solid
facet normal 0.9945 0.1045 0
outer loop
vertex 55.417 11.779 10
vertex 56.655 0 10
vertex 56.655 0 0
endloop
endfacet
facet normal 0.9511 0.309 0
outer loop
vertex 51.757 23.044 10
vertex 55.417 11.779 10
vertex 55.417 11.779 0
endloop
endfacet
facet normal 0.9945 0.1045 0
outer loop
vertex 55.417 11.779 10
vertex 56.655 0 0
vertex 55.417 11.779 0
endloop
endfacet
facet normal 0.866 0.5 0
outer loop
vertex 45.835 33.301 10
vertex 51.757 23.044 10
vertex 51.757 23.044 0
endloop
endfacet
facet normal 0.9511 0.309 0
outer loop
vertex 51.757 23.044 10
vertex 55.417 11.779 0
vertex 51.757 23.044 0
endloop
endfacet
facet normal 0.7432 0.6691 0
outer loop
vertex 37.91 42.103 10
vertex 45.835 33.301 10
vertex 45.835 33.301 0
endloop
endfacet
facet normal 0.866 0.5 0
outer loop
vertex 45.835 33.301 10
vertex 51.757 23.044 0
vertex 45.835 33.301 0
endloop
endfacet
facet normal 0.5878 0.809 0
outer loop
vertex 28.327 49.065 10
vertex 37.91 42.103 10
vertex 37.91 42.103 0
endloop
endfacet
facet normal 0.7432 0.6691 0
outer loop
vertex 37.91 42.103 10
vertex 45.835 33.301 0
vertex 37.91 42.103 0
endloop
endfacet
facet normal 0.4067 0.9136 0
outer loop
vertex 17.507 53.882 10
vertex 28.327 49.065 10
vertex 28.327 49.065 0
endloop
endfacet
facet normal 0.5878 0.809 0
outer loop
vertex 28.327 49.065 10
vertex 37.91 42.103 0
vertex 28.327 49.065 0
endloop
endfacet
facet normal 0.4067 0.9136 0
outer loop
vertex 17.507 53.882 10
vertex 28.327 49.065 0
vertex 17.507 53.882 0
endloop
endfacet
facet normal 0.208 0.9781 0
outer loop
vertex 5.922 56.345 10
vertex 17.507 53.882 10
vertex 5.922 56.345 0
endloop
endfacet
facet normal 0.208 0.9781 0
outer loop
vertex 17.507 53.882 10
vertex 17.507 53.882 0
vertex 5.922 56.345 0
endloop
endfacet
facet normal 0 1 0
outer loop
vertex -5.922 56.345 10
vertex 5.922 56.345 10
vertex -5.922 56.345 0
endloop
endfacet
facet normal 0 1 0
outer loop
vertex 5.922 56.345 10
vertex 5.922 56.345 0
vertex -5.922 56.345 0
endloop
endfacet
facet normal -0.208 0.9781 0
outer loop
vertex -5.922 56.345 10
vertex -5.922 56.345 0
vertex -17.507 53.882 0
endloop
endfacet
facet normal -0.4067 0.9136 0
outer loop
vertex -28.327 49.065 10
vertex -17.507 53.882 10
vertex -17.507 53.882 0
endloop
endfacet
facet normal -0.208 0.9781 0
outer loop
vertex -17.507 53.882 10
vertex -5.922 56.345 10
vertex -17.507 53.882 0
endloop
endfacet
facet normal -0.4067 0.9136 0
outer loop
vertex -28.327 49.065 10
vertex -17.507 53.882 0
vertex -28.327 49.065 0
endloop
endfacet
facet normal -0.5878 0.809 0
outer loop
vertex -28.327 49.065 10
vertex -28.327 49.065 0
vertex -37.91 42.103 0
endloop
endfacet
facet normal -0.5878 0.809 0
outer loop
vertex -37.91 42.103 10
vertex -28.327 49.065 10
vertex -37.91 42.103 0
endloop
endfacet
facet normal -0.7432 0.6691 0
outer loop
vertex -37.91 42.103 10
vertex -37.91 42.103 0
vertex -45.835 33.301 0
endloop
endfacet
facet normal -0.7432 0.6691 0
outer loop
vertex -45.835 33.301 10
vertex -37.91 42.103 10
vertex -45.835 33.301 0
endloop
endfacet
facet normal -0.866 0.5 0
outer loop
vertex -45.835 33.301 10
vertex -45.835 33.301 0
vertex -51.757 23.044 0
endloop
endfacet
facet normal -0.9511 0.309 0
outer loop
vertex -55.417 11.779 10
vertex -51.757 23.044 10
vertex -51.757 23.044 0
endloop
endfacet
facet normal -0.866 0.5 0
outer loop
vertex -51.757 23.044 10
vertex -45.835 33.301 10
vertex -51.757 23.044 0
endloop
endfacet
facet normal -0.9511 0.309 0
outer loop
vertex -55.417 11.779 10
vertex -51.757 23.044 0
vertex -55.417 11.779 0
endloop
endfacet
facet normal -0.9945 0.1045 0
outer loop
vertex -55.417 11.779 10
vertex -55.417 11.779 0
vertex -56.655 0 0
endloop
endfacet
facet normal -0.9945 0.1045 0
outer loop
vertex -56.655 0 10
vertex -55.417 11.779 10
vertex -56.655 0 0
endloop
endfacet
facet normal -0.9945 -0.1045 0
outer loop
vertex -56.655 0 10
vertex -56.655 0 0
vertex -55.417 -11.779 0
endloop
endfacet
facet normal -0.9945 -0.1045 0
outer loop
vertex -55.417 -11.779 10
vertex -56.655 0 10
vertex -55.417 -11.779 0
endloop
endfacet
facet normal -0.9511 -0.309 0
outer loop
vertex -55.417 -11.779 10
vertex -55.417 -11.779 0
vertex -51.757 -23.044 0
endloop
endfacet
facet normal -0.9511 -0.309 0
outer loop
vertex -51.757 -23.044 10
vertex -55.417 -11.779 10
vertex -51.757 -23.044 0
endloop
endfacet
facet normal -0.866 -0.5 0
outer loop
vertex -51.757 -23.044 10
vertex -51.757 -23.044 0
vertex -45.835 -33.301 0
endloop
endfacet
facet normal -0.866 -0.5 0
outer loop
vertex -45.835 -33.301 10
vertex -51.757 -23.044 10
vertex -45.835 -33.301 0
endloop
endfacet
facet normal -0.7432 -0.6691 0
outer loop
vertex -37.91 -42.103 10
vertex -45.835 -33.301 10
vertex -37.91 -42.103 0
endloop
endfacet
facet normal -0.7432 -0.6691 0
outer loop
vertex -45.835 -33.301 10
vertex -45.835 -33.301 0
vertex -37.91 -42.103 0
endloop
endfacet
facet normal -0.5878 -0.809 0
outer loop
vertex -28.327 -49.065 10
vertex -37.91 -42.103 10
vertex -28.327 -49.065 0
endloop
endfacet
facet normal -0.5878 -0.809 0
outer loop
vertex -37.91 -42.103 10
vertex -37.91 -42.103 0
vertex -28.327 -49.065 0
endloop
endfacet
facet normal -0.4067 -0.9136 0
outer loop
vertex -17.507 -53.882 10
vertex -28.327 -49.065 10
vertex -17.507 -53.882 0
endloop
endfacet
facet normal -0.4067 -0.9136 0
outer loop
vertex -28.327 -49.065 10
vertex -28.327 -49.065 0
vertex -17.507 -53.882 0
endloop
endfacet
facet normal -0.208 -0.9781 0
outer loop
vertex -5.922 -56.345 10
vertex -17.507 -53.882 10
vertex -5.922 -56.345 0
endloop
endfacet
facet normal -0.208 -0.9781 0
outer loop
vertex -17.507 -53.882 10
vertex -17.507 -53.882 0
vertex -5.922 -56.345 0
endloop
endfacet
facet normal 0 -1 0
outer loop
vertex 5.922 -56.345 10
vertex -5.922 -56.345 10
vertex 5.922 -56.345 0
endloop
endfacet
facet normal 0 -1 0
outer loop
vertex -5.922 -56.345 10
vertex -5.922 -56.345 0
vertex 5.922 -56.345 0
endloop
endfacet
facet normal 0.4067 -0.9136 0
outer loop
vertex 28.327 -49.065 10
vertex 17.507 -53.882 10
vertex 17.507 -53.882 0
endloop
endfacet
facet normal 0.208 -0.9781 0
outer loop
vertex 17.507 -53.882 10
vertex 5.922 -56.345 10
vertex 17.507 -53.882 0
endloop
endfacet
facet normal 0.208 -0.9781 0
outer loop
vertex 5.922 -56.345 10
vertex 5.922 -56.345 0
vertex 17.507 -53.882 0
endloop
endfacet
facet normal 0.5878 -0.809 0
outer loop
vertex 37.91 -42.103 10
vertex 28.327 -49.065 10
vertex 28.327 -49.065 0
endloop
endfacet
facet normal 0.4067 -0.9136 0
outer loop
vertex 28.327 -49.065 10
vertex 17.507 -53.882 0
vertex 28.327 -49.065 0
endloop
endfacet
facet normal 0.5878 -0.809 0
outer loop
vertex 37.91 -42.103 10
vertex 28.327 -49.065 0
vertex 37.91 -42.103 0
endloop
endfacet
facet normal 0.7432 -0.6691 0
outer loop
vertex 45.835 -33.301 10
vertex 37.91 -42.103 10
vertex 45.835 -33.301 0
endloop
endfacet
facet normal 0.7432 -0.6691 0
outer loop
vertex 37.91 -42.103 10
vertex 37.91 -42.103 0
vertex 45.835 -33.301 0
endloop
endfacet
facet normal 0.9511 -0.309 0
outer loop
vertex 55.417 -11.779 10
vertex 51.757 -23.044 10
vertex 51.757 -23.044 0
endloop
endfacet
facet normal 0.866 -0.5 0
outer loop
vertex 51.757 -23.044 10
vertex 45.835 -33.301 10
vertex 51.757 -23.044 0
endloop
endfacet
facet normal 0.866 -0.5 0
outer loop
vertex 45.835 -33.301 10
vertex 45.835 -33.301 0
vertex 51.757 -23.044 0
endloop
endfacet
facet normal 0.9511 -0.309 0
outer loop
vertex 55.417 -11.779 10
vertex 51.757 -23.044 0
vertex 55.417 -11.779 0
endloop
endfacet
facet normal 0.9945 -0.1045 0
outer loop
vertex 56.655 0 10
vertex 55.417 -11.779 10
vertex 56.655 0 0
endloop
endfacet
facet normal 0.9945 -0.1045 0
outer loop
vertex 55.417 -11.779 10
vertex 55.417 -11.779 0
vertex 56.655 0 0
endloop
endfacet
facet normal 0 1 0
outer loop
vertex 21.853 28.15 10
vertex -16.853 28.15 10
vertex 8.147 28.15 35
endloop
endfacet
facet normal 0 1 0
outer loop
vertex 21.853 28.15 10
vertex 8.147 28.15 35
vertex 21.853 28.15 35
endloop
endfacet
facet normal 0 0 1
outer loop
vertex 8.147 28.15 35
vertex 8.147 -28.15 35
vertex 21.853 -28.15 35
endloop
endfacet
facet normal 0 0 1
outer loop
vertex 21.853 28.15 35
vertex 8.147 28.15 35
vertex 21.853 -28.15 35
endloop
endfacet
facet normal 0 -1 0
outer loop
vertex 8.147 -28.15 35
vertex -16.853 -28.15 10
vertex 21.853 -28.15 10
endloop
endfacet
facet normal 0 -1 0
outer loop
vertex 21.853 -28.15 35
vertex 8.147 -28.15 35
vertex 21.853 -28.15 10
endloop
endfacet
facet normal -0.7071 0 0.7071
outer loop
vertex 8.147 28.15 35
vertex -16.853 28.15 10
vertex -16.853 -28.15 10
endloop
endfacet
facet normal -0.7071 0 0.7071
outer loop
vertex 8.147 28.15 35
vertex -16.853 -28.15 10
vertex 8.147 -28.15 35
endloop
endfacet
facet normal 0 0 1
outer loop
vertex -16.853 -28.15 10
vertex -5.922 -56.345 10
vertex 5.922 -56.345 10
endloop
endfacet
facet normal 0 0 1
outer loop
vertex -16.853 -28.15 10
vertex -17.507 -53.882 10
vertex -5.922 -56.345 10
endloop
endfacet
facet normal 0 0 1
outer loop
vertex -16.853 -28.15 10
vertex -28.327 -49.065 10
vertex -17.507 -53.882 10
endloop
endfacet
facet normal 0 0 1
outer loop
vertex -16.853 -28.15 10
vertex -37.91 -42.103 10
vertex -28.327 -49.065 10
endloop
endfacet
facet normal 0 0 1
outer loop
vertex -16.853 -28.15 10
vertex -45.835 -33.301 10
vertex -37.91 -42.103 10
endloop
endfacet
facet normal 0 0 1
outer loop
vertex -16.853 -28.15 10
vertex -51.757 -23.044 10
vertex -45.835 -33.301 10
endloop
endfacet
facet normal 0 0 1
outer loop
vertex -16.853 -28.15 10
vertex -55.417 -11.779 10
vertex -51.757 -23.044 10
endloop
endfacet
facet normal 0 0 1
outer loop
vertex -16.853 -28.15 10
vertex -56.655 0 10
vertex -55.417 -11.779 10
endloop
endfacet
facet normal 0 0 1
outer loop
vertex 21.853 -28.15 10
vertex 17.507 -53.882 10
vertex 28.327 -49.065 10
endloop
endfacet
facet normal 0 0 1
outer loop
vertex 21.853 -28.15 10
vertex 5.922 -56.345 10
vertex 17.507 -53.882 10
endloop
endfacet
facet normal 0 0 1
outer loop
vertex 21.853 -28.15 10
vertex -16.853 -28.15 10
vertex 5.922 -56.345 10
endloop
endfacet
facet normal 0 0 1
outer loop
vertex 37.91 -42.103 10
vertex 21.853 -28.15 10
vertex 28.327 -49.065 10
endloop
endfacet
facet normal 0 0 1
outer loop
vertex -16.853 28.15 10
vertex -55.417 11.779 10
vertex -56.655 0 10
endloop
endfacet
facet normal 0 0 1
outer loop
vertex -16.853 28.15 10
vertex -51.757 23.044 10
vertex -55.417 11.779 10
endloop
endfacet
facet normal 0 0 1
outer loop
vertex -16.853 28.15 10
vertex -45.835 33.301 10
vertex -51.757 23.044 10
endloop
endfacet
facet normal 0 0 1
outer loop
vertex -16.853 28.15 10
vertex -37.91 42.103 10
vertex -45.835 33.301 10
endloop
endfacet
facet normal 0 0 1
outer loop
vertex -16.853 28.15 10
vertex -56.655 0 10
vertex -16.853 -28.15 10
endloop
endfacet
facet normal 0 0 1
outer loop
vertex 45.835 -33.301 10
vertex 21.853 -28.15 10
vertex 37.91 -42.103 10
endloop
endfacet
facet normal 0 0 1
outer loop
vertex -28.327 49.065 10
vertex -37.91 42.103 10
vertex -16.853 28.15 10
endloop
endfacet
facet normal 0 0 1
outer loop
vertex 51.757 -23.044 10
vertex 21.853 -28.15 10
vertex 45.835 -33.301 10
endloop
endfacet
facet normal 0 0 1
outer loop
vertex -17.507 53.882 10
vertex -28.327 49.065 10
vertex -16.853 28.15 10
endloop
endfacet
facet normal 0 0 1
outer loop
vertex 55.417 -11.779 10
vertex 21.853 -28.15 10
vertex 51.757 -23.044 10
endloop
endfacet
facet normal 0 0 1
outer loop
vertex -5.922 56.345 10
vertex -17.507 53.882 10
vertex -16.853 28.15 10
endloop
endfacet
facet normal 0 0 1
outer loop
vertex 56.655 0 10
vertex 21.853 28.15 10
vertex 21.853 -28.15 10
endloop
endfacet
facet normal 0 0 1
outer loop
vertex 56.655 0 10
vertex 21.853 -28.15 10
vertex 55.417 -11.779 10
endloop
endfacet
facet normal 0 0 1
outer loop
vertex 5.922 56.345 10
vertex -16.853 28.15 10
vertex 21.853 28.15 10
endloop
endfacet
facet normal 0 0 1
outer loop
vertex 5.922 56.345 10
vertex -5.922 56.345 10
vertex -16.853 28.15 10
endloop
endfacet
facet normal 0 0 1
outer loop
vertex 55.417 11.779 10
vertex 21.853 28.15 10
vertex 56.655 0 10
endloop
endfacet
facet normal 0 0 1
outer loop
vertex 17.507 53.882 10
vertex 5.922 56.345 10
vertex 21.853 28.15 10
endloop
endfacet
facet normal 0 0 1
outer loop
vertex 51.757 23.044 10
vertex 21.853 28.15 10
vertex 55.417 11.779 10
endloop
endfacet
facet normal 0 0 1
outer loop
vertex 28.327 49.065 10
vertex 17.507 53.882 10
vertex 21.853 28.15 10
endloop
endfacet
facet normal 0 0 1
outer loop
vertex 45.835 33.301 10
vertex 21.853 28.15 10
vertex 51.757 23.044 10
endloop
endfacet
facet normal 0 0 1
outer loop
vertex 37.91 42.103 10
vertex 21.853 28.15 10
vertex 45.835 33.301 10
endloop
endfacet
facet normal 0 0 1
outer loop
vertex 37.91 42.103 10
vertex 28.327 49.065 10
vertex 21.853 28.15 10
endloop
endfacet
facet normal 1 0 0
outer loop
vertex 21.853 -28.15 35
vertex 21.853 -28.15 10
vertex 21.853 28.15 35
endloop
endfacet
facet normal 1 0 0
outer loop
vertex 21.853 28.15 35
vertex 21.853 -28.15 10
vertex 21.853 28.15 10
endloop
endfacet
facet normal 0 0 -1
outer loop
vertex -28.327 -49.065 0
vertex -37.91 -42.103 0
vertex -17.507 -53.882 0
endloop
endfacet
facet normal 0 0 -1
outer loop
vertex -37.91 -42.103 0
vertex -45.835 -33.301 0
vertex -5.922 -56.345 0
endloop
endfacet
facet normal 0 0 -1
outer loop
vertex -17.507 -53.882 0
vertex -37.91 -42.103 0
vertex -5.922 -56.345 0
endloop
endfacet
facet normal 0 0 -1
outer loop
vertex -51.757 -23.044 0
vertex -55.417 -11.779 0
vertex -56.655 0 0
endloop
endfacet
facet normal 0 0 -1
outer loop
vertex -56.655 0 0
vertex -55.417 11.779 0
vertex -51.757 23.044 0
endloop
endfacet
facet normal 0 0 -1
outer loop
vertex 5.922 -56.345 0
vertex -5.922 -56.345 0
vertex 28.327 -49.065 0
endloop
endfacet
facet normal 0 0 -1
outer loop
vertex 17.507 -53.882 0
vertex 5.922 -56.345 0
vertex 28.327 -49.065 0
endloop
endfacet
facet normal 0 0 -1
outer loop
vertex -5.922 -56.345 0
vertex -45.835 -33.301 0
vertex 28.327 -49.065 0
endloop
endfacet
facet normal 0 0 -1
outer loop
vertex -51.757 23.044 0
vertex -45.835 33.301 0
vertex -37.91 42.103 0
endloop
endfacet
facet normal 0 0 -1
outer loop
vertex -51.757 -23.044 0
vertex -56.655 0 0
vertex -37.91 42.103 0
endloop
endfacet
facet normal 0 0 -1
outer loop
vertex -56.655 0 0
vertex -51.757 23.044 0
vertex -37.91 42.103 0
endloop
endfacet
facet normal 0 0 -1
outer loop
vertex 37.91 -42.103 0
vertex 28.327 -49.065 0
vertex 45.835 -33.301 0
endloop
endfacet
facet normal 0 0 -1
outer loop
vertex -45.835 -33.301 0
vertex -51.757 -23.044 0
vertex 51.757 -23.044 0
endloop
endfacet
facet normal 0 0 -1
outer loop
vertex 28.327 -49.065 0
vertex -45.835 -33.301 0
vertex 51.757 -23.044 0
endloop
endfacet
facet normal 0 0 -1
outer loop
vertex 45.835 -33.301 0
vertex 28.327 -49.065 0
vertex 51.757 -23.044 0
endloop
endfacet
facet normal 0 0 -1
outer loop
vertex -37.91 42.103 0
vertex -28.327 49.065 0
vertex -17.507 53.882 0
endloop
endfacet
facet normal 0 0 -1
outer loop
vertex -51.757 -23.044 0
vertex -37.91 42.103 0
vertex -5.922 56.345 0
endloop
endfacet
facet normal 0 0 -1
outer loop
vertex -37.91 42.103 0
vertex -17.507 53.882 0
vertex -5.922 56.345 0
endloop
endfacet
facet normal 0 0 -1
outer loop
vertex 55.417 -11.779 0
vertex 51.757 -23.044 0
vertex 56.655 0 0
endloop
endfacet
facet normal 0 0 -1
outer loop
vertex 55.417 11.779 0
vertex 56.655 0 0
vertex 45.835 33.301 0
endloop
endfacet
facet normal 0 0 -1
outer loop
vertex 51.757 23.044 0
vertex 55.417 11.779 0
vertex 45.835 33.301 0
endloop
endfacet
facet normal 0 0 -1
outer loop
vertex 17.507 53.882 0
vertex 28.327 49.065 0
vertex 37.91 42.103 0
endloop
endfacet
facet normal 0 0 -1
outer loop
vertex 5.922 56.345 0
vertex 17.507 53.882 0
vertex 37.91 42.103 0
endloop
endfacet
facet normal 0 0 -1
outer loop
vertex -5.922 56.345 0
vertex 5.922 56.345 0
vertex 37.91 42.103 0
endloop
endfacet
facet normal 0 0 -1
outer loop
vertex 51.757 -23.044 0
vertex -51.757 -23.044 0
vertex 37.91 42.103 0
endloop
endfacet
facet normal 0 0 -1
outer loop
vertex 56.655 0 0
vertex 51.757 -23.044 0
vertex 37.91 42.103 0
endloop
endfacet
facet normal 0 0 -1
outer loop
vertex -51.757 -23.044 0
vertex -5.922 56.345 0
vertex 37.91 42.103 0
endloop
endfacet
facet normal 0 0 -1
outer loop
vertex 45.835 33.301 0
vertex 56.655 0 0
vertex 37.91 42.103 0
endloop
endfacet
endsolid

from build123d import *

# Parameters (mm, degrees)
F0_R        = 56.6549127416
F1_DEPTH    = 10
F2_W        = 43.7059700489
F2_H        = 56.300342083
F3_DEPTH    = 25
F4_T4_DEPTH = 210.6013213609


# Not quite as in the source:
# - a fillet or chamfer that OpenCascade refuses, or shapes differently, is made with other operations: its cross-section is extruded or revolved along the edge and cut away or added


with BuildPart() as f1:
    # F0 (on Top) → F1 (new body)
    with BuildSketch(Plane.XY):
        Circle(F0_R)
    extrude(amount=F1_DEPTH)

    # F2 (on face) → F3 (join)
    with BuildSketch(Plane.XY.offset(10)):
        Rectangle(F2_W, F2_H)
    extrude(amount=F3_DEPTH)

    # F4: chamfer of 30 on 1 edges, made by hand


with BuildPart() as f4_tool2:
    # F4_s3 → F4_t4 (new body)
    with BuildSketch(Plane.XZ.offset(-105.3006606805)):
        Polygon((-21.8529850245, 5), (8.1470149755, 35), (-21.8529850245, 35), align=None)
    extrude(amount=F4_T4_DEPTH)

    split(bisect_by=Plane.XY.offset(10), keep=Keep.TOP)


with BuildPart() as f1_1:
    add(f1.part)

    # F4_t1: cut F4_tool2
    add(f4_tool2.part, mode=Mode.SUBTRACT)


solid = f1_1.part
